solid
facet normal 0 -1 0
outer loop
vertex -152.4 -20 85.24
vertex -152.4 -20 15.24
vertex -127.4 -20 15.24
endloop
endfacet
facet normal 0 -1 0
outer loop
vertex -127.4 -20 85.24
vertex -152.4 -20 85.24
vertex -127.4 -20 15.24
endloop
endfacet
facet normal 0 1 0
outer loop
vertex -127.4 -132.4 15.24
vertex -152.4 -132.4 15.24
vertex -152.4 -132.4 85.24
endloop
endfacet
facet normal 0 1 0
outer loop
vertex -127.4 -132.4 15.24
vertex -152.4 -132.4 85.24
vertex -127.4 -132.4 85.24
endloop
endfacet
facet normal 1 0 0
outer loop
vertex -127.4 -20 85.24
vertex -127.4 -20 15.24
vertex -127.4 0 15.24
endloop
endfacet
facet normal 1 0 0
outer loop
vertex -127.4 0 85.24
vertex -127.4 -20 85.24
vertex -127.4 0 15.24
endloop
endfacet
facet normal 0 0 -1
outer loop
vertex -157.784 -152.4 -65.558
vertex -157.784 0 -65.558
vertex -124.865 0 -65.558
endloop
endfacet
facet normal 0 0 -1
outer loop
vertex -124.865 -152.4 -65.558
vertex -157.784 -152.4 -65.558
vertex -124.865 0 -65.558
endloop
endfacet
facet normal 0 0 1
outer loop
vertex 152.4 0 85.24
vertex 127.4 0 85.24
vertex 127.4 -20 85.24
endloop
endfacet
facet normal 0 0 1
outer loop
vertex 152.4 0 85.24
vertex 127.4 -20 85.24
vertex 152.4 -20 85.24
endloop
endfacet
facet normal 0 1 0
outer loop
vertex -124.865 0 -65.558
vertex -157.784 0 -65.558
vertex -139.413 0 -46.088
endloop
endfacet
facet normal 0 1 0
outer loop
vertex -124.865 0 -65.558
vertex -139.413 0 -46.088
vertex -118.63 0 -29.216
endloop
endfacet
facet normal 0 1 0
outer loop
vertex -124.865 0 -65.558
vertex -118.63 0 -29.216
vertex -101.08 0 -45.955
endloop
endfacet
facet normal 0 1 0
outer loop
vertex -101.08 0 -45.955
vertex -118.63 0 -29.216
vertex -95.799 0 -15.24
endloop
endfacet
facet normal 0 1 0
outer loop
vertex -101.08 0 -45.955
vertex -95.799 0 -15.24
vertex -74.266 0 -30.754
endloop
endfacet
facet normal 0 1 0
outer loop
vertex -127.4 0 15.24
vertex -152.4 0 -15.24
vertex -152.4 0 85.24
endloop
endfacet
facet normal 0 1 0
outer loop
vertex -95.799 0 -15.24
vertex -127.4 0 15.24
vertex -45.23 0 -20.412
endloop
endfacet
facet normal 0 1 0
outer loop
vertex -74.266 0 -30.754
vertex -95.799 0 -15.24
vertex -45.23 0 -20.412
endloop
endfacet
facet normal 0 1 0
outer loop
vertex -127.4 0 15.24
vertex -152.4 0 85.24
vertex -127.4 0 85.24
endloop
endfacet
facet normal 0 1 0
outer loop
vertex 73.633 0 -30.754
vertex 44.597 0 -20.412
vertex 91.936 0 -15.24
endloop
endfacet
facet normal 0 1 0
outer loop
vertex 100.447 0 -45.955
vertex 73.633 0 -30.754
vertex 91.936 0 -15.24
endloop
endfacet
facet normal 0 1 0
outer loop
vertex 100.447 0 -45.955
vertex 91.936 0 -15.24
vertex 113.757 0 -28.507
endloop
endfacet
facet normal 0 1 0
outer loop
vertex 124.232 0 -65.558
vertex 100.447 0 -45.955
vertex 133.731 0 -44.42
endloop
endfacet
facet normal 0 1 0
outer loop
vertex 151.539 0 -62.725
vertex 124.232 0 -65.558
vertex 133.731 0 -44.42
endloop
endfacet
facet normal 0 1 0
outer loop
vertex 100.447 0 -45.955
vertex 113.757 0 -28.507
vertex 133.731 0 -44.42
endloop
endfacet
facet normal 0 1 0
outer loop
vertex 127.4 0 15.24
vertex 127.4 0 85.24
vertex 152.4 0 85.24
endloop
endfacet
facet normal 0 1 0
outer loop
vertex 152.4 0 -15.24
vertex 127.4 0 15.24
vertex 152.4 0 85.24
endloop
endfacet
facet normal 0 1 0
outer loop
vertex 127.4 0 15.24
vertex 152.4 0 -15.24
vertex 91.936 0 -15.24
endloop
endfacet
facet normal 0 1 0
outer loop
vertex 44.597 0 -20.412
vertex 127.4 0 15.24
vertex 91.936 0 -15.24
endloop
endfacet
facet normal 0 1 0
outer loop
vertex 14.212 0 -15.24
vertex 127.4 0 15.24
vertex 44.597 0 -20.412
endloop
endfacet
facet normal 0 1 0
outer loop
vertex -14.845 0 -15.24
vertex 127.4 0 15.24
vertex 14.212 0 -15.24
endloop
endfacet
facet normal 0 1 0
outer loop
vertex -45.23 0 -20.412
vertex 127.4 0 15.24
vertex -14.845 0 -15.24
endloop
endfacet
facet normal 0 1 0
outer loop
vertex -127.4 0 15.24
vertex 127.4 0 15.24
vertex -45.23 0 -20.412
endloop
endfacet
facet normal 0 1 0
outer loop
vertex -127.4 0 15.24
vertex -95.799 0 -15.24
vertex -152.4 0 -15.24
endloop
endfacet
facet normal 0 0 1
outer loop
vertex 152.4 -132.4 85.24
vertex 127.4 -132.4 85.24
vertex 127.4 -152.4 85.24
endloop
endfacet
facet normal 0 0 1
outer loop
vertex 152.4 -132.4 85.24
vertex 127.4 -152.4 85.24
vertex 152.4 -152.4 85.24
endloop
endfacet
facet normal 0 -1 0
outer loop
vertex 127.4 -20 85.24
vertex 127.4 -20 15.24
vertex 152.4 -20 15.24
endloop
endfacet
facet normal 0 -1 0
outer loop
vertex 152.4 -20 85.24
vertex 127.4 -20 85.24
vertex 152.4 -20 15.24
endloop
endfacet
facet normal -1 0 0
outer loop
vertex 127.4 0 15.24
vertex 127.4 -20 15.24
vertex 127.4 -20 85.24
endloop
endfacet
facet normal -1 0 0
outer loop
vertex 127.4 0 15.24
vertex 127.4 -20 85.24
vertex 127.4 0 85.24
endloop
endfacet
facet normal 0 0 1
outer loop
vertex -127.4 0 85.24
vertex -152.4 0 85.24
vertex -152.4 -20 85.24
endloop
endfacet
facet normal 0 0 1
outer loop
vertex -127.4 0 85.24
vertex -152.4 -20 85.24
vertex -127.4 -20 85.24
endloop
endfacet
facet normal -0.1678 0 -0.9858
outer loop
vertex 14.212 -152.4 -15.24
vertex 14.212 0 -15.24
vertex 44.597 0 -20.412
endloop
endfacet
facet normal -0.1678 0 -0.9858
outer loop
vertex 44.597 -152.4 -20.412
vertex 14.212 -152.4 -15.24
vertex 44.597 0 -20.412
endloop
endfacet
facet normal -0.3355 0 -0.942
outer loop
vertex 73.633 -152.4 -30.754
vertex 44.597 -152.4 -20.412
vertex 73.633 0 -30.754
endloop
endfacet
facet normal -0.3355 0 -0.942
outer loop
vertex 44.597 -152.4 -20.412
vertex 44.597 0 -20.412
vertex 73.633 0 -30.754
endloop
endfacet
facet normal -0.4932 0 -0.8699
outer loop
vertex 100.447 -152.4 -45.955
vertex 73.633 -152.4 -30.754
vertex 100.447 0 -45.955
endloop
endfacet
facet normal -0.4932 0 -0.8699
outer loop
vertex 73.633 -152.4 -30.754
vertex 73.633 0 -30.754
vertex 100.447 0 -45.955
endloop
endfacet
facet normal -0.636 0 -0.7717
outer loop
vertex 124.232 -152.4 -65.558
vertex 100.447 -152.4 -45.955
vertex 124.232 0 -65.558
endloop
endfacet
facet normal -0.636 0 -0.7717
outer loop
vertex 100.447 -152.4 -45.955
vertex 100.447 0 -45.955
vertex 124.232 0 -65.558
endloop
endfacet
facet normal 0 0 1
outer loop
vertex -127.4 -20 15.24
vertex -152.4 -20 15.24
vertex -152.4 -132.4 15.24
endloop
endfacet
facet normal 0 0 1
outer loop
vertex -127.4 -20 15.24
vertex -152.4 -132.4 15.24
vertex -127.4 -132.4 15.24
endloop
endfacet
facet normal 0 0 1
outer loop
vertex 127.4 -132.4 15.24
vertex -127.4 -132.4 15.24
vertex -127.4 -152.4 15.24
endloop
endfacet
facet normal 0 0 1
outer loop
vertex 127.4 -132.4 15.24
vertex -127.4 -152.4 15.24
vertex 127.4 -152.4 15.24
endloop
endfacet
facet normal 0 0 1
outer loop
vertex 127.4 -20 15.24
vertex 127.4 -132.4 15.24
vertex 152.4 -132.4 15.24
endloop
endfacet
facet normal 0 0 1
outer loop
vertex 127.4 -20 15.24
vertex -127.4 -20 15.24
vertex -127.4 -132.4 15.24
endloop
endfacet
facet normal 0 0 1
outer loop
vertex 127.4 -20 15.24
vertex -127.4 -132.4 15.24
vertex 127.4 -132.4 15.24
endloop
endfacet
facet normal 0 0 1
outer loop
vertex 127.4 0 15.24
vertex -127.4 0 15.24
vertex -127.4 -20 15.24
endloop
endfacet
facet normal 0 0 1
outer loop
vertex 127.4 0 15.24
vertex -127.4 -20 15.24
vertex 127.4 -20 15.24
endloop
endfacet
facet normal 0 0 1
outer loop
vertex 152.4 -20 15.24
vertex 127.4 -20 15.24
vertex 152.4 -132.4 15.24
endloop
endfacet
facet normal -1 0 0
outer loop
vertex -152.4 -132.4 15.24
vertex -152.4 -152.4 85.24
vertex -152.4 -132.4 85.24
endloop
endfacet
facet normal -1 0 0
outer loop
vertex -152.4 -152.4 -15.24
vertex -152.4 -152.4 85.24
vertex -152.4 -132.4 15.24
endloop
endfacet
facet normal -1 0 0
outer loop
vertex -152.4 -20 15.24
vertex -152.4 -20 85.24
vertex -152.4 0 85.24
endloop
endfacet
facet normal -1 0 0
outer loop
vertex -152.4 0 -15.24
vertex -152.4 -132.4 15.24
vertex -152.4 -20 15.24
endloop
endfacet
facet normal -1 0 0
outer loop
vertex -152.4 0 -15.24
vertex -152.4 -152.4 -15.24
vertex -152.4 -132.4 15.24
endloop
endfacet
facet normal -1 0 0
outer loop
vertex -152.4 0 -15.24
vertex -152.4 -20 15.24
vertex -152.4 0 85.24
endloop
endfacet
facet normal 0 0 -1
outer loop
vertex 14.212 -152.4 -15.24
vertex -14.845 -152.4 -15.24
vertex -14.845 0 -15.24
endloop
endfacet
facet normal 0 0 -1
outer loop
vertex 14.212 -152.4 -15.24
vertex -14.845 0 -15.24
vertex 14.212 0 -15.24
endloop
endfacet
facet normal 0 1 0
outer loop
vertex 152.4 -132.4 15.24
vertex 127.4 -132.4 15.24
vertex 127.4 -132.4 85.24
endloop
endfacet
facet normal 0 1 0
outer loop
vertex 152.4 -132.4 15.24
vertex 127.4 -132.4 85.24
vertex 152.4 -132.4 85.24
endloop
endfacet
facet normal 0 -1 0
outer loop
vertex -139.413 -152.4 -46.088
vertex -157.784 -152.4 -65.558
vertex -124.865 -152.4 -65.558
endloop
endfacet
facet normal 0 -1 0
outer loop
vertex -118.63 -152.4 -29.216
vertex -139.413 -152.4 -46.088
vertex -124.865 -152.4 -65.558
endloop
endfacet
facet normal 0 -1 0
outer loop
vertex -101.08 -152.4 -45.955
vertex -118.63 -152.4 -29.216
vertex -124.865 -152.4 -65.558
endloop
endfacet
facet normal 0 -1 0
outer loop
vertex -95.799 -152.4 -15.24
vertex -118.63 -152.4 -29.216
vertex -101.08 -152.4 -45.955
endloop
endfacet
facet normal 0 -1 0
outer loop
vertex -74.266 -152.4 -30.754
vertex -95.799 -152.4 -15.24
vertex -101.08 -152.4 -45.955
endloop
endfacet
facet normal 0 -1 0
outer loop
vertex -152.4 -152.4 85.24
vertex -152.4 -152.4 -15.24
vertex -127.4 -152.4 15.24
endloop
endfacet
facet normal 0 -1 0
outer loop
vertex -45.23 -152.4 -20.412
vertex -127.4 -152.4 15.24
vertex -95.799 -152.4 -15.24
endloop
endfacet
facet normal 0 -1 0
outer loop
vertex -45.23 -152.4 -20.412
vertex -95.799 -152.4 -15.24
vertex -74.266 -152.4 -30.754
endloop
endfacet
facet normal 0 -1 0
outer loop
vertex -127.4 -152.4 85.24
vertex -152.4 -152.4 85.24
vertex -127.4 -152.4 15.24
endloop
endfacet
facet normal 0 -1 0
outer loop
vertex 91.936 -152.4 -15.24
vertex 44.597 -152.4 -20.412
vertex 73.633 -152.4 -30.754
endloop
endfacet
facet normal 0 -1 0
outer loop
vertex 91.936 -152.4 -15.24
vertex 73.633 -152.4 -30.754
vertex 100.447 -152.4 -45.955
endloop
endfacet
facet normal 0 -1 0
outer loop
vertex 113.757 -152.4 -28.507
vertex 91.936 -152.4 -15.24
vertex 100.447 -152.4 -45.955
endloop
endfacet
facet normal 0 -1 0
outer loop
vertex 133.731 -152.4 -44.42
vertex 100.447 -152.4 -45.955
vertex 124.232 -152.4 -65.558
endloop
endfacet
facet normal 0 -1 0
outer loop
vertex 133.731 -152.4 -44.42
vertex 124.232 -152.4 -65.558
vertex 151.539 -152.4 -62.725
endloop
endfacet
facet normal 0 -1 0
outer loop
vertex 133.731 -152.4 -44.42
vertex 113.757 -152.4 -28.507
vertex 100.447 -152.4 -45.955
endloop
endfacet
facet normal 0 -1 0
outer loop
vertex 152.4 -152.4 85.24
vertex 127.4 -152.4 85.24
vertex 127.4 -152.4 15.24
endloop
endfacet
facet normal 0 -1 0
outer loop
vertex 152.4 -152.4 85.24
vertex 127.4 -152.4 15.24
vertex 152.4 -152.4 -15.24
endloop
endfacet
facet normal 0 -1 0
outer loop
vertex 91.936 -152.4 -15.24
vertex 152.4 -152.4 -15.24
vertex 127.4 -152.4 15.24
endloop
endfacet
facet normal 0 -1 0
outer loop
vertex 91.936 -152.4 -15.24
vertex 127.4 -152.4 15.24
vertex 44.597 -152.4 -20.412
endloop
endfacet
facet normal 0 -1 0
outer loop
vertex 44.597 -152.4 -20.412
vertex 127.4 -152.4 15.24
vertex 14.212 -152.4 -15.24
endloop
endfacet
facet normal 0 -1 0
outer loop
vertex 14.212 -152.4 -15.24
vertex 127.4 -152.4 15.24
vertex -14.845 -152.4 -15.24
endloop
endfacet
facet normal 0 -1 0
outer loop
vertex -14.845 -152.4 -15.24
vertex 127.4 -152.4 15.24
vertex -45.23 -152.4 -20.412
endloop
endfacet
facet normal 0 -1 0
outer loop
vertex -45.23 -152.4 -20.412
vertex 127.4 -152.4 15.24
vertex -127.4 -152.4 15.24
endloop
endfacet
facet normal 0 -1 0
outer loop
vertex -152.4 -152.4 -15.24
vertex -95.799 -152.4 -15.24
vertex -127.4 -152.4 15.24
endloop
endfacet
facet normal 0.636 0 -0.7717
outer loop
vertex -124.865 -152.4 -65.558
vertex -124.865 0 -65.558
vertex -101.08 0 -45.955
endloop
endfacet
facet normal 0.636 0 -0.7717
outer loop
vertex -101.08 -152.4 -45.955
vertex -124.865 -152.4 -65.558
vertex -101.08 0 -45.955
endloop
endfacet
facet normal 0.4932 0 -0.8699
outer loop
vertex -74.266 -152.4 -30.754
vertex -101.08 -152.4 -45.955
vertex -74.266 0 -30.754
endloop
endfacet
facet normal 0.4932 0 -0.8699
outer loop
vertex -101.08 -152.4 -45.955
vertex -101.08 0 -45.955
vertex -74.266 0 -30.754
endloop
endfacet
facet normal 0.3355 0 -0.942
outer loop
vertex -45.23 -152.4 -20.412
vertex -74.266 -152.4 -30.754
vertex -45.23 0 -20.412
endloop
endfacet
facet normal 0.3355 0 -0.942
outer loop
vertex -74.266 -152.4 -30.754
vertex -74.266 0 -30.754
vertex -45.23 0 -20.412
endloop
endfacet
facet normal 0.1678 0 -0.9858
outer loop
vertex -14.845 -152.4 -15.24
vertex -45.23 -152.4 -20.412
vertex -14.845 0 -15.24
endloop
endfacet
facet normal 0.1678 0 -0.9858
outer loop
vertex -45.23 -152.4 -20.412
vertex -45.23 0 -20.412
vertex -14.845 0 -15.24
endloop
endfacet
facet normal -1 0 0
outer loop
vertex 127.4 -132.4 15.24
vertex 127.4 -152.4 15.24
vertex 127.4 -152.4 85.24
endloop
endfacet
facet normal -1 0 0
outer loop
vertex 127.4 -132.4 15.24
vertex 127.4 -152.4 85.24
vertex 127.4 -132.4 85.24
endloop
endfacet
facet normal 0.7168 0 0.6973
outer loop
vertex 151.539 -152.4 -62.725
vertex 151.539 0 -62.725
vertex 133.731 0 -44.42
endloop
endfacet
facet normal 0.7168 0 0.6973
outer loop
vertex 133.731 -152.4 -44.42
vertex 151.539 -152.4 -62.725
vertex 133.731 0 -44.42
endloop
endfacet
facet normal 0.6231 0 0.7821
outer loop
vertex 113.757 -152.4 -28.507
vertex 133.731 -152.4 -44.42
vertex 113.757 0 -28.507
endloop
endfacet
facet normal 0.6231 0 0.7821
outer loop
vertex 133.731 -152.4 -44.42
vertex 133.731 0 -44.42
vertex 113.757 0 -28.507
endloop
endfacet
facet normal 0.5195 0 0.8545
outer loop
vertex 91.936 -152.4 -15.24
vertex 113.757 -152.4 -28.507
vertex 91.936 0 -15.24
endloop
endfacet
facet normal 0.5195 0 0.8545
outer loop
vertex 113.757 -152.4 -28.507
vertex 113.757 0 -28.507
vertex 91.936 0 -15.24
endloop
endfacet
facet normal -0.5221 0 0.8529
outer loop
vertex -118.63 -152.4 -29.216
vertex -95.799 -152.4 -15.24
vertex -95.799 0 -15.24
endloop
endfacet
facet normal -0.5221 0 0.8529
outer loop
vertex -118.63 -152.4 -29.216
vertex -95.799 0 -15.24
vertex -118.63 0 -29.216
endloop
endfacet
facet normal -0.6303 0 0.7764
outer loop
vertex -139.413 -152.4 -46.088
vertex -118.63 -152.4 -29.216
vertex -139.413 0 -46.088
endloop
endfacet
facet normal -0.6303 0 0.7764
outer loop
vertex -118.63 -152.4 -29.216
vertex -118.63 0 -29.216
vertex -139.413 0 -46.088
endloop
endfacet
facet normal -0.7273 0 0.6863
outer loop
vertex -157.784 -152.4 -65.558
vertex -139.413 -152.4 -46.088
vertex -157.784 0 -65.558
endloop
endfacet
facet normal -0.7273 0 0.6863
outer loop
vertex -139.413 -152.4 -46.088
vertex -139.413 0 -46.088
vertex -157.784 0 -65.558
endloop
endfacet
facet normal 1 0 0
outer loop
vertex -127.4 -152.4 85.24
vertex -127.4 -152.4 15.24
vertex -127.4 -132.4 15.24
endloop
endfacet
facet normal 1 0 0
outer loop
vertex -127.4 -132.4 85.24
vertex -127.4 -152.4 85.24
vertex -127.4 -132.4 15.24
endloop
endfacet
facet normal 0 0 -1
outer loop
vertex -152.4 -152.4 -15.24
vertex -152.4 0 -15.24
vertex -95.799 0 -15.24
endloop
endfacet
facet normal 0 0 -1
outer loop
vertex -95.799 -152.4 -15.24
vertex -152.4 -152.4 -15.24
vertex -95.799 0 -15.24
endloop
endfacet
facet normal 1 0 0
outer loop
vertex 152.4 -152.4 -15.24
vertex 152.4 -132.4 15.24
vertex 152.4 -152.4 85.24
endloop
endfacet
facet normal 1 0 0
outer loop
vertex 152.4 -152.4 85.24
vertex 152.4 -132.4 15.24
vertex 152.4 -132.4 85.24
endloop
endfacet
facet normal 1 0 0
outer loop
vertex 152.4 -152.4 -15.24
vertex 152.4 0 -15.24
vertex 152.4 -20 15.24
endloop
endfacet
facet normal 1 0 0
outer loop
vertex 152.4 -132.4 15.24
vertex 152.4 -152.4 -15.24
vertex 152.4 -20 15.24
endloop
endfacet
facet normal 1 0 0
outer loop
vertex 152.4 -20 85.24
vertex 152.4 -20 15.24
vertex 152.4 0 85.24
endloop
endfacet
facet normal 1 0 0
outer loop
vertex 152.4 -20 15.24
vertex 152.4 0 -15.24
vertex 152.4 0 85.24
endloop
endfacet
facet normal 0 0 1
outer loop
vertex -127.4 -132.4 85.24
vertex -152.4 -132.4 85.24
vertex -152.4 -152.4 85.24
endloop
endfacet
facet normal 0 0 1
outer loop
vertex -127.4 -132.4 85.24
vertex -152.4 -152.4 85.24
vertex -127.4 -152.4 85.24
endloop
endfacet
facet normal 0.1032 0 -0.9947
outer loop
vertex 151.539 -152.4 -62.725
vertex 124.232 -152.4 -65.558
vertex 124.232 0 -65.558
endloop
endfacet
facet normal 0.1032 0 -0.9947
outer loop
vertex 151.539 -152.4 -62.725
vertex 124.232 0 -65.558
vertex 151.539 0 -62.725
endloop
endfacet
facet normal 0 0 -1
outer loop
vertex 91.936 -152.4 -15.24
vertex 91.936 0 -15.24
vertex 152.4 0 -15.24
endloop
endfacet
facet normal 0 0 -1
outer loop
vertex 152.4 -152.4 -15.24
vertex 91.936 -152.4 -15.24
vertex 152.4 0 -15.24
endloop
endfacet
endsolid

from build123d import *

# Parameters (mm, degrees)
F0_W     = 304.8
F0_H     = 30.48
F1_DEPTH = 152.4
F2_W     = 25
F2_H     = 20
F3_DEPTH = 70
F5_DEPTH = 152.4


# Not quite as in the source:
# - the program builds the solid bodies; features that only make, move or delete a surface that nothing else refers to are left out


with BuildPart() as f1:
    # F0 (on Front) → F1 (new body)
    with BuildSketch(Plane.XZ):
        Rectangle(F0_W, F0_H)
    extrude(amount=F1_DEPTH)

    # F2 (on face) → F3 (join)
    with BuildSketch(Plane.XY.offset(15.24)):
        with Locations((-139.9, -10)):
            Rectangle(F2_W, F2_H)
        with Locations((-139.9, -142.4)):
            Rectangle(F2_W, F2_H)
        with Locations((139.9, -10)):
            Rectangle(F2_W, F2_H)
        with Locations((139.9, -142.4)):
            Rectangle(F2_W, F2_H)
    extrude(amount=F3_DEPTH)

    # F4 (on Front) → F5 (join)
    with BuildSketch(Plane.XZ):
        with BuildLine():
            Line((124.2321878223, -65.5579566956), (151.5389296347, -62.7254612585))
            ThreePointArc((151.5389296347, -62.7254612585), (-3.7822030549, 7.8738857172), (-157.7844321728, -65.5579566956))
            Line((-157.7844321728, -65.5579566956), (-124.8654021339, -65.5579566956))
            ThreePointArc((-124.8654021339, -65.5579566956), (-0.3166071558, -14.6454567478), (124.2321878223, -65.5579566956))
        make_face()
    extrude(amount=F5_DEPTH)


solid = f1.part
